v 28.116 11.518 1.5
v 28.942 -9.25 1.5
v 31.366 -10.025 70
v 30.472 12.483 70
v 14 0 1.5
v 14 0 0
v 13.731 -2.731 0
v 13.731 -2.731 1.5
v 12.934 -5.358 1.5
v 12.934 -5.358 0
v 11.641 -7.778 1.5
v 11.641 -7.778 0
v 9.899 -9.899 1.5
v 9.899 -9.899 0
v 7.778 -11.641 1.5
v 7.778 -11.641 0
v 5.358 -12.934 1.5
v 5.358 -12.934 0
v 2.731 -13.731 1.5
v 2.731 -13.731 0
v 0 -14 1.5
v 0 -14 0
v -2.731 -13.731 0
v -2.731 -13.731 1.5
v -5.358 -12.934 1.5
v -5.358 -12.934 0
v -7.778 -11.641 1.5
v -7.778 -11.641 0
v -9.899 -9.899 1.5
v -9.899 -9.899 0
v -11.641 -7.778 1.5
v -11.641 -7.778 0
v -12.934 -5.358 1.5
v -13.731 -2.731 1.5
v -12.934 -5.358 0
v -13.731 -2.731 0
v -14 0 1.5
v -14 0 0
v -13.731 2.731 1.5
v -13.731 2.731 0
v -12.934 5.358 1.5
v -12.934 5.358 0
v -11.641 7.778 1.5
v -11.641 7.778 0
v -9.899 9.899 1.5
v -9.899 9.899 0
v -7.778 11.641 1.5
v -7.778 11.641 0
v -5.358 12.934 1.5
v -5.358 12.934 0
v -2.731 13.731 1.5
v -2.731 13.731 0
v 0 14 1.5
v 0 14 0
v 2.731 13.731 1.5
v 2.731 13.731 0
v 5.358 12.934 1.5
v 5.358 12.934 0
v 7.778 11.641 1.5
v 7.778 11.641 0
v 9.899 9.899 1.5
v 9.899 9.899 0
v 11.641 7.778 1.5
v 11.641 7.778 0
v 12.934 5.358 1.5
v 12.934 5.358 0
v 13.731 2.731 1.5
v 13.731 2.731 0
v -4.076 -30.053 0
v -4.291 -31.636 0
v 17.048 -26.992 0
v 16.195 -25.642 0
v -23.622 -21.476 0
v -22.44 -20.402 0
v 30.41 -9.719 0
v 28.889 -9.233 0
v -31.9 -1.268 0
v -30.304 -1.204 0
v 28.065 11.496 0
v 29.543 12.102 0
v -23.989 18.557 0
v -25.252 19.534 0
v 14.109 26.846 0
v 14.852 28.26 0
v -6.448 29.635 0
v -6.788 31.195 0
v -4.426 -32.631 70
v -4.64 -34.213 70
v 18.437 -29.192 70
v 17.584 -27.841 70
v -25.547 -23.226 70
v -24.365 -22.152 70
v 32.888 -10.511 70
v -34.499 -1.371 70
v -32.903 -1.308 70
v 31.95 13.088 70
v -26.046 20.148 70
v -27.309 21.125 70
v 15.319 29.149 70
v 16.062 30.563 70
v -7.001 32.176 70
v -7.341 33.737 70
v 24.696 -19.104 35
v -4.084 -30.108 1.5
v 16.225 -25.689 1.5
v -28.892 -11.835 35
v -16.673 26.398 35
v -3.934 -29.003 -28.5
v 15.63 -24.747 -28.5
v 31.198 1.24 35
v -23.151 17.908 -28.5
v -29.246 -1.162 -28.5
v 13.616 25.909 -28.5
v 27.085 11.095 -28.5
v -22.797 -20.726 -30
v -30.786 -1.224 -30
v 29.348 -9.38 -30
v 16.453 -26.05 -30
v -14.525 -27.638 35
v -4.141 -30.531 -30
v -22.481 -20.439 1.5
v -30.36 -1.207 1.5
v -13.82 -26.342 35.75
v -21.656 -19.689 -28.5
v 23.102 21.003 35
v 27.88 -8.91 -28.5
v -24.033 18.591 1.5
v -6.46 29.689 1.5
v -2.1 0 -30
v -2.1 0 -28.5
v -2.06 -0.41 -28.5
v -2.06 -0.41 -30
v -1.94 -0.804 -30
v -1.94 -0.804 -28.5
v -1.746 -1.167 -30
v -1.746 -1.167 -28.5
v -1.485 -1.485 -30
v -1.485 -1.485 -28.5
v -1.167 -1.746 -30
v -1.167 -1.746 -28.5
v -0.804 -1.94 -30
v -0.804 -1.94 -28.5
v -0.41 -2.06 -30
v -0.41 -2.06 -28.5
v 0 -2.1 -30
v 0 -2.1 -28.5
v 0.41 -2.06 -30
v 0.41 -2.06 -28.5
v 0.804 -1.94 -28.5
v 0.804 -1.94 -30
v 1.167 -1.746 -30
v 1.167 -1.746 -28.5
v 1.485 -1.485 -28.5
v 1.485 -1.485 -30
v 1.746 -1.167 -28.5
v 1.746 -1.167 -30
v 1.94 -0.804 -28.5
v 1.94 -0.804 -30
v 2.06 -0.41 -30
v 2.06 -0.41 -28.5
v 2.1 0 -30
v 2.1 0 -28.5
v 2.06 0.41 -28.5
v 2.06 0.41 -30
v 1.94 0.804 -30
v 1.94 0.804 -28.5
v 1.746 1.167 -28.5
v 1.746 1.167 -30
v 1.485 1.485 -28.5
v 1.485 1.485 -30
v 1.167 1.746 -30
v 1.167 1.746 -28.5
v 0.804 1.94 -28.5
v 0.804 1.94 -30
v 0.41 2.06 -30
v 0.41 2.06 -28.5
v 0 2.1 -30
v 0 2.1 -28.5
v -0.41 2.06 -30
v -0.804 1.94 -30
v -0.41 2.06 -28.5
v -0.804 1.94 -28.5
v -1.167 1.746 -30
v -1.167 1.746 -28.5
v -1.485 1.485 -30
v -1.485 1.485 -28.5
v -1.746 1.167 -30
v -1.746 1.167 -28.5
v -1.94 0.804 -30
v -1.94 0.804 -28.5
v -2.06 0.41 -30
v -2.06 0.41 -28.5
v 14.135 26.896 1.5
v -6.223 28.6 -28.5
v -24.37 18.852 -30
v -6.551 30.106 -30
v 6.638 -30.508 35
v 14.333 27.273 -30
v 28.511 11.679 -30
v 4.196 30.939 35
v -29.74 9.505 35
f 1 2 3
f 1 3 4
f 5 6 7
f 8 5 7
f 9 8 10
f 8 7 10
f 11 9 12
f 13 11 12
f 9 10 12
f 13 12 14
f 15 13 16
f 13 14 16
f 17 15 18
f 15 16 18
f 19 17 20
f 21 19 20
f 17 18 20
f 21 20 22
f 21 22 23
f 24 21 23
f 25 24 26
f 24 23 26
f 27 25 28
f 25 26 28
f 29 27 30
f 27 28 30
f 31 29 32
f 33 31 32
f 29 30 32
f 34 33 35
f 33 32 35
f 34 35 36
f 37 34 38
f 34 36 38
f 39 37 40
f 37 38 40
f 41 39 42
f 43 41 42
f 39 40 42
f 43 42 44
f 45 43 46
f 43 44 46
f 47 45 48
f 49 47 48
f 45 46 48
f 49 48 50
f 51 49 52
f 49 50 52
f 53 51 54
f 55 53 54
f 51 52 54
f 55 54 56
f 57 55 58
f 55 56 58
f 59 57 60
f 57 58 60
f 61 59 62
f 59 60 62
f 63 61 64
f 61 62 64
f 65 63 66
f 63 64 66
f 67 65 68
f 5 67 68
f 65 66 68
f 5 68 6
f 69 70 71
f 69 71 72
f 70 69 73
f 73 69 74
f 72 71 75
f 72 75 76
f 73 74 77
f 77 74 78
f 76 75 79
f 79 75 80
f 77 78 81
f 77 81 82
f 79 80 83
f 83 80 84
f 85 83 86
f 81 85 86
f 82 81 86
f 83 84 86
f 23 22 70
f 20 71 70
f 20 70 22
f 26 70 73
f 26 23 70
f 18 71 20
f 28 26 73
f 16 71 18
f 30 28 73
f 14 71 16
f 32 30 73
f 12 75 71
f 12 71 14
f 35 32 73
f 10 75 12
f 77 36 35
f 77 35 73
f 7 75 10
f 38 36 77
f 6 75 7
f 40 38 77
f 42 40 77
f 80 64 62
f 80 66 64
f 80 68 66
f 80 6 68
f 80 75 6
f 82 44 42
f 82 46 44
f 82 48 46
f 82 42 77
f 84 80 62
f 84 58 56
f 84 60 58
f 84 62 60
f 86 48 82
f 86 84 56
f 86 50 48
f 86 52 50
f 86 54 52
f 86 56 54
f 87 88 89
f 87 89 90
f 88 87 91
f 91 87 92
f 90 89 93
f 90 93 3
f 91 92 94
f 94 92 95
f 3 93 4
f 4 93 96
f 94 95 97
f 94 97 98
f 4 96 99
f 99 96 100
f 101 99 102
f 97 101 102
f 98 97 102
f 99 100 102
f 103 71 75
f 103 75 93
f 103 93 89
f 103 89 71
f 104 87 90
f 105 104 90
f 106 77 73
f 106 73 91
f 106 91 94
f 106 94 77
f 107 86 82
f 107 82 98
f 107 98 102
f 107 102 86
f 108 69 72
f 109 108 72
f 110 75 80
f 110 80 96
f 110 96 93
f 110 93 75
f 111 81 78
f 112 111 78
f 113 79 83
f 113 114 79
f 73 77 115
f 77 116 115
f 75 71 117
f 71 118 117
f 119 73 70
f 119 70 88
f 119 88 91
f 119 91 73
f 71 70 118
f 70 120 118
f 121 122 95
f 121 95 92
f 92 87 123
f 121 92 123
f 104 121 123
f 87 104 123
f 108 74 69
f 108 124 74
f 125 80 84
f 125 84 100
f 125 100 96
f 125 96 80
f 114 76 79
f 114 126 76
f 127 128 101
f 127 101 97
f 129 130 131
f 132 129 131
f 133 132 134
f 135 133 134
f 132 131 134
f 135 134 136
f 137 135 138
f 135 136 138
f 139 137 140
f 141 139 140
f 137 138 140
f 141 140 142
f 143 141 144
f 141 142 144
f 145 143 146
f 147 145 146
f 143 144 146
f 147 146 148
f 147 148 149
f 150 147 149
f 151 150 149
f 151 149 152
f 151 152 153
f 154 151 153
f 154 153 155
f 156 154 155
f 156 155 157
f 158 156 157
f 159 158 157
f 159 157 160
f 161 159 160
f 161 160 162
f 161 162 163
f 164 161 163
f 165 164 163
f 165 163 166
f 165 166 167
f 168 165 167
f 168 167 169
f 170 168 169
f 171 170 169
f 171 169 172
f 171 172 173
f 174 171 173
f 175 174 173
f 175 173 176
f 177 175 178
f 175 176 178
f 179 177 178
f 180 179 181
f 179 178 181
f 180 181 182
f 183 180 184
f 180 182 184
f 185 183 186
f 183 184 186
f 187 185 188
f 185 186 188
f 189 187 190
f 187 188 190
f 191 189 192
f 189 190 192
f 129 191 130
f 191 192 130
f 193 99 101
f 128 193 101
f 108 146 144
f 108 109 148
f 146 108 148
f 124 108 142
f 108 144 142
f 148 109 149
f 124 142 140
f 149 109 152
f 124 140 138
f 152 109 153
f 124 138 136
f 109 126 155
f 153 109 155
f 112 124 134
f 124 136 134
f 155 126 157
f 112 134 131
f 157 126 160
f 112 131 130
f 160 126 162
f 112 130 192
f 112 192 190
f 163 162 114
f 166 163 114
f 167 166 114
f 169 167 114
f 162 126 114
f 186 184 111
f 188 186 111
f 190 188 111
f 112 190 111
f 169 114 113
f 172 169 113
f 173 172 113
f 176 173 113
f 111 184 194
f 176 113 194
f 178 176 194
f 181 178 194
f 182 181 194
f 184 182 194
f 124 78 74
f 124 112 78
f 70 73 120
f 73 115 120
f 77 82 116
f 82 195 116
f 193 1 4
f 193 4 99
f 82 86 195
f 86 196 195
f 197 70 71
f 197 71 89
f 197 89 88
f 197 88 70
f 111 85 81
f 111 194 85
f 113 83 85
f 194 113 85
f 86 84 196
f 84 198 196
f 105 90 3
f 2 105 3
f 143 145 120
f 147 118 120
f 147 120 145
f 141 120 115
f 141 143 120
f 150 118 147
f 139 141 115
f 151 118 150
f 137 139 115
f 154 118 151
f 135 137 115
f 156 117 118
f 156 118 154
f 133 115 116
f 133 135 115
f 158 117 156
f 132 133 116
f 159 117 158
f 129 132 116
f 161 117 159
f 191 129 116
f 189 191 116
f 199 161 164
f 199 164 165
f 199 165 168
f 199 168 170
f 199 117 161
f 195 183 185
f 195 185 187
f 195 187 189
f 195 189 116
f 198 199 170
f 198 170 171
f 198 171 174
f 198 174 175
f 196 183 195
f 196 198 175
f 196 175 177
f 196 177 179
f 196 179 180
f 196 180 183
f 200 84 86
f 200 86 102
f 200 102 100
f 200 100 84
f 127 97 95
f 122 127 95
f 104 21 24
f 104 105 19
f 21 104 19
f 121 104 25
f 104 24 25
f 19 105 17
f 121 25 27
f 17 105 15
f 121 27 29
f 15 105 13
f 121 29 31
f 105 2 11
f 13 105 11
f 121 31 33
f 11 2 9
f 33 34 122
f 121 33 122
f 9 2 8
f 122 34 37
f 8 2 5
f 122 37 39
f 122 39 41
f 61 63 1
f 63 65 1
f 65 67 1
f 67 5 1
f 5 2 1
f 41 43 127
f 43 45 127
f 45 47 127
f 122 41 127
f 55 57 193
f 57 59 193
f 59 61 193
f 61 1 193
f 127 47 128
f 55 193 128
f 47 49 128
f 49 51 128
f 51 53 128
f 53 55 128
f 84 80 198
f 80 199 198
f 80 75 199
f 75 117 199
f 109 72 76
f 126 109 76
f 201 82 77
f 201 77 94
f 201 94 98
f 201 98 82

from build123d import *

# Parameters (mm, degrees)
F1_DEPTH = 70
F1_TAPER = -2
F2_T     = -1.5
F3_R     = 14
F4_DEPTH = 1.5
F5_DEPTH = 30
F5_TAPER = 2
F6_T     = -1.5
F8_D     = 4.2
F8_DEPTH = 17.25
F8_TIP   = 1.2618073


with BuildPart() as f1:
    # F0 (on Top) → F1 (new body)
    with BuildSketch(Plane.XY):
        Polygon((17.0480676249, -26.9924116845), (30.4099652563, -9.7191003389), (29.5427021752, 12.101886071), (14.8520804157, 28.2602654909), (-6.7879948327, 31.1953526096), (-25.2518918588, 19.5337875446), (-31.9001480406, -1.2678538064), (-23.6219704236, -21.4762522707), (-4.2908103164, -31.6356736157), align=None)
    extrude(amount=F1_DEPTH, taper=F1_TAPER)

    # F2
    f2_openings = [f1.faces().sort_by_distance(p)[0] for p in [
        (0, 0, 70),
    ]]
    offset(amount=F2_T, openings=f2_openings)

    # F3 (on face) → F4 (cut, through all)
    with BuildSketch(Plane(origin=(0, 0, 0), x_dir=(1, 0, 0), z_dir=(0, 0, -1))):
        Circle(F3_R)
    extrude(amount=-F4_DEPTH, mode=Mode.SUBTRACT)


with BuildPart() as f5:
    # F0 (on Top) → F5 (new body)
    with BuildSketch(Plane.XY):
        Polygon((17.0480676249, -26.9924116845), (30.4099652563, -9.7191003389), (29.5427021752, 12.101886071), (14.8520804157, 28.2602654909), (-6.7879948327, 31.1953526096), (-25.2518918588, 19.5337875446), (-31.9001480406, -1.2678538064), (-23.6219704236, -21.4762522707), (-4.2908103164, -31.6356736157), align=None)
    extrude(amount=-F5_DEPTH, taper=F5_TAPER)

    # F6
    f6_openings = [f5.faces().sort_by_distance(p)[0] for p in [
        (0, 0, 0),
    ]]
    offset(amount=F6_T, openings=f6_openings)

    # F8
    with Locations(Plane(origin=(0, 0, -30), x_dir=(1, 0, 0), z_dir=(0, 0, -1))):
        with Locations((0, 0)):
            Hole(F8_D / 2, depth=F8_DEPTH)
            with Locations((0, 0, -(F8_DEPTH + F8_TIP / 2))):  # 118° drill point
                Cone(0, F8_D / 2, F8_TIP, mode=Mode.SUBTRACT)


solid = Compound([f1.part, f5.part])
